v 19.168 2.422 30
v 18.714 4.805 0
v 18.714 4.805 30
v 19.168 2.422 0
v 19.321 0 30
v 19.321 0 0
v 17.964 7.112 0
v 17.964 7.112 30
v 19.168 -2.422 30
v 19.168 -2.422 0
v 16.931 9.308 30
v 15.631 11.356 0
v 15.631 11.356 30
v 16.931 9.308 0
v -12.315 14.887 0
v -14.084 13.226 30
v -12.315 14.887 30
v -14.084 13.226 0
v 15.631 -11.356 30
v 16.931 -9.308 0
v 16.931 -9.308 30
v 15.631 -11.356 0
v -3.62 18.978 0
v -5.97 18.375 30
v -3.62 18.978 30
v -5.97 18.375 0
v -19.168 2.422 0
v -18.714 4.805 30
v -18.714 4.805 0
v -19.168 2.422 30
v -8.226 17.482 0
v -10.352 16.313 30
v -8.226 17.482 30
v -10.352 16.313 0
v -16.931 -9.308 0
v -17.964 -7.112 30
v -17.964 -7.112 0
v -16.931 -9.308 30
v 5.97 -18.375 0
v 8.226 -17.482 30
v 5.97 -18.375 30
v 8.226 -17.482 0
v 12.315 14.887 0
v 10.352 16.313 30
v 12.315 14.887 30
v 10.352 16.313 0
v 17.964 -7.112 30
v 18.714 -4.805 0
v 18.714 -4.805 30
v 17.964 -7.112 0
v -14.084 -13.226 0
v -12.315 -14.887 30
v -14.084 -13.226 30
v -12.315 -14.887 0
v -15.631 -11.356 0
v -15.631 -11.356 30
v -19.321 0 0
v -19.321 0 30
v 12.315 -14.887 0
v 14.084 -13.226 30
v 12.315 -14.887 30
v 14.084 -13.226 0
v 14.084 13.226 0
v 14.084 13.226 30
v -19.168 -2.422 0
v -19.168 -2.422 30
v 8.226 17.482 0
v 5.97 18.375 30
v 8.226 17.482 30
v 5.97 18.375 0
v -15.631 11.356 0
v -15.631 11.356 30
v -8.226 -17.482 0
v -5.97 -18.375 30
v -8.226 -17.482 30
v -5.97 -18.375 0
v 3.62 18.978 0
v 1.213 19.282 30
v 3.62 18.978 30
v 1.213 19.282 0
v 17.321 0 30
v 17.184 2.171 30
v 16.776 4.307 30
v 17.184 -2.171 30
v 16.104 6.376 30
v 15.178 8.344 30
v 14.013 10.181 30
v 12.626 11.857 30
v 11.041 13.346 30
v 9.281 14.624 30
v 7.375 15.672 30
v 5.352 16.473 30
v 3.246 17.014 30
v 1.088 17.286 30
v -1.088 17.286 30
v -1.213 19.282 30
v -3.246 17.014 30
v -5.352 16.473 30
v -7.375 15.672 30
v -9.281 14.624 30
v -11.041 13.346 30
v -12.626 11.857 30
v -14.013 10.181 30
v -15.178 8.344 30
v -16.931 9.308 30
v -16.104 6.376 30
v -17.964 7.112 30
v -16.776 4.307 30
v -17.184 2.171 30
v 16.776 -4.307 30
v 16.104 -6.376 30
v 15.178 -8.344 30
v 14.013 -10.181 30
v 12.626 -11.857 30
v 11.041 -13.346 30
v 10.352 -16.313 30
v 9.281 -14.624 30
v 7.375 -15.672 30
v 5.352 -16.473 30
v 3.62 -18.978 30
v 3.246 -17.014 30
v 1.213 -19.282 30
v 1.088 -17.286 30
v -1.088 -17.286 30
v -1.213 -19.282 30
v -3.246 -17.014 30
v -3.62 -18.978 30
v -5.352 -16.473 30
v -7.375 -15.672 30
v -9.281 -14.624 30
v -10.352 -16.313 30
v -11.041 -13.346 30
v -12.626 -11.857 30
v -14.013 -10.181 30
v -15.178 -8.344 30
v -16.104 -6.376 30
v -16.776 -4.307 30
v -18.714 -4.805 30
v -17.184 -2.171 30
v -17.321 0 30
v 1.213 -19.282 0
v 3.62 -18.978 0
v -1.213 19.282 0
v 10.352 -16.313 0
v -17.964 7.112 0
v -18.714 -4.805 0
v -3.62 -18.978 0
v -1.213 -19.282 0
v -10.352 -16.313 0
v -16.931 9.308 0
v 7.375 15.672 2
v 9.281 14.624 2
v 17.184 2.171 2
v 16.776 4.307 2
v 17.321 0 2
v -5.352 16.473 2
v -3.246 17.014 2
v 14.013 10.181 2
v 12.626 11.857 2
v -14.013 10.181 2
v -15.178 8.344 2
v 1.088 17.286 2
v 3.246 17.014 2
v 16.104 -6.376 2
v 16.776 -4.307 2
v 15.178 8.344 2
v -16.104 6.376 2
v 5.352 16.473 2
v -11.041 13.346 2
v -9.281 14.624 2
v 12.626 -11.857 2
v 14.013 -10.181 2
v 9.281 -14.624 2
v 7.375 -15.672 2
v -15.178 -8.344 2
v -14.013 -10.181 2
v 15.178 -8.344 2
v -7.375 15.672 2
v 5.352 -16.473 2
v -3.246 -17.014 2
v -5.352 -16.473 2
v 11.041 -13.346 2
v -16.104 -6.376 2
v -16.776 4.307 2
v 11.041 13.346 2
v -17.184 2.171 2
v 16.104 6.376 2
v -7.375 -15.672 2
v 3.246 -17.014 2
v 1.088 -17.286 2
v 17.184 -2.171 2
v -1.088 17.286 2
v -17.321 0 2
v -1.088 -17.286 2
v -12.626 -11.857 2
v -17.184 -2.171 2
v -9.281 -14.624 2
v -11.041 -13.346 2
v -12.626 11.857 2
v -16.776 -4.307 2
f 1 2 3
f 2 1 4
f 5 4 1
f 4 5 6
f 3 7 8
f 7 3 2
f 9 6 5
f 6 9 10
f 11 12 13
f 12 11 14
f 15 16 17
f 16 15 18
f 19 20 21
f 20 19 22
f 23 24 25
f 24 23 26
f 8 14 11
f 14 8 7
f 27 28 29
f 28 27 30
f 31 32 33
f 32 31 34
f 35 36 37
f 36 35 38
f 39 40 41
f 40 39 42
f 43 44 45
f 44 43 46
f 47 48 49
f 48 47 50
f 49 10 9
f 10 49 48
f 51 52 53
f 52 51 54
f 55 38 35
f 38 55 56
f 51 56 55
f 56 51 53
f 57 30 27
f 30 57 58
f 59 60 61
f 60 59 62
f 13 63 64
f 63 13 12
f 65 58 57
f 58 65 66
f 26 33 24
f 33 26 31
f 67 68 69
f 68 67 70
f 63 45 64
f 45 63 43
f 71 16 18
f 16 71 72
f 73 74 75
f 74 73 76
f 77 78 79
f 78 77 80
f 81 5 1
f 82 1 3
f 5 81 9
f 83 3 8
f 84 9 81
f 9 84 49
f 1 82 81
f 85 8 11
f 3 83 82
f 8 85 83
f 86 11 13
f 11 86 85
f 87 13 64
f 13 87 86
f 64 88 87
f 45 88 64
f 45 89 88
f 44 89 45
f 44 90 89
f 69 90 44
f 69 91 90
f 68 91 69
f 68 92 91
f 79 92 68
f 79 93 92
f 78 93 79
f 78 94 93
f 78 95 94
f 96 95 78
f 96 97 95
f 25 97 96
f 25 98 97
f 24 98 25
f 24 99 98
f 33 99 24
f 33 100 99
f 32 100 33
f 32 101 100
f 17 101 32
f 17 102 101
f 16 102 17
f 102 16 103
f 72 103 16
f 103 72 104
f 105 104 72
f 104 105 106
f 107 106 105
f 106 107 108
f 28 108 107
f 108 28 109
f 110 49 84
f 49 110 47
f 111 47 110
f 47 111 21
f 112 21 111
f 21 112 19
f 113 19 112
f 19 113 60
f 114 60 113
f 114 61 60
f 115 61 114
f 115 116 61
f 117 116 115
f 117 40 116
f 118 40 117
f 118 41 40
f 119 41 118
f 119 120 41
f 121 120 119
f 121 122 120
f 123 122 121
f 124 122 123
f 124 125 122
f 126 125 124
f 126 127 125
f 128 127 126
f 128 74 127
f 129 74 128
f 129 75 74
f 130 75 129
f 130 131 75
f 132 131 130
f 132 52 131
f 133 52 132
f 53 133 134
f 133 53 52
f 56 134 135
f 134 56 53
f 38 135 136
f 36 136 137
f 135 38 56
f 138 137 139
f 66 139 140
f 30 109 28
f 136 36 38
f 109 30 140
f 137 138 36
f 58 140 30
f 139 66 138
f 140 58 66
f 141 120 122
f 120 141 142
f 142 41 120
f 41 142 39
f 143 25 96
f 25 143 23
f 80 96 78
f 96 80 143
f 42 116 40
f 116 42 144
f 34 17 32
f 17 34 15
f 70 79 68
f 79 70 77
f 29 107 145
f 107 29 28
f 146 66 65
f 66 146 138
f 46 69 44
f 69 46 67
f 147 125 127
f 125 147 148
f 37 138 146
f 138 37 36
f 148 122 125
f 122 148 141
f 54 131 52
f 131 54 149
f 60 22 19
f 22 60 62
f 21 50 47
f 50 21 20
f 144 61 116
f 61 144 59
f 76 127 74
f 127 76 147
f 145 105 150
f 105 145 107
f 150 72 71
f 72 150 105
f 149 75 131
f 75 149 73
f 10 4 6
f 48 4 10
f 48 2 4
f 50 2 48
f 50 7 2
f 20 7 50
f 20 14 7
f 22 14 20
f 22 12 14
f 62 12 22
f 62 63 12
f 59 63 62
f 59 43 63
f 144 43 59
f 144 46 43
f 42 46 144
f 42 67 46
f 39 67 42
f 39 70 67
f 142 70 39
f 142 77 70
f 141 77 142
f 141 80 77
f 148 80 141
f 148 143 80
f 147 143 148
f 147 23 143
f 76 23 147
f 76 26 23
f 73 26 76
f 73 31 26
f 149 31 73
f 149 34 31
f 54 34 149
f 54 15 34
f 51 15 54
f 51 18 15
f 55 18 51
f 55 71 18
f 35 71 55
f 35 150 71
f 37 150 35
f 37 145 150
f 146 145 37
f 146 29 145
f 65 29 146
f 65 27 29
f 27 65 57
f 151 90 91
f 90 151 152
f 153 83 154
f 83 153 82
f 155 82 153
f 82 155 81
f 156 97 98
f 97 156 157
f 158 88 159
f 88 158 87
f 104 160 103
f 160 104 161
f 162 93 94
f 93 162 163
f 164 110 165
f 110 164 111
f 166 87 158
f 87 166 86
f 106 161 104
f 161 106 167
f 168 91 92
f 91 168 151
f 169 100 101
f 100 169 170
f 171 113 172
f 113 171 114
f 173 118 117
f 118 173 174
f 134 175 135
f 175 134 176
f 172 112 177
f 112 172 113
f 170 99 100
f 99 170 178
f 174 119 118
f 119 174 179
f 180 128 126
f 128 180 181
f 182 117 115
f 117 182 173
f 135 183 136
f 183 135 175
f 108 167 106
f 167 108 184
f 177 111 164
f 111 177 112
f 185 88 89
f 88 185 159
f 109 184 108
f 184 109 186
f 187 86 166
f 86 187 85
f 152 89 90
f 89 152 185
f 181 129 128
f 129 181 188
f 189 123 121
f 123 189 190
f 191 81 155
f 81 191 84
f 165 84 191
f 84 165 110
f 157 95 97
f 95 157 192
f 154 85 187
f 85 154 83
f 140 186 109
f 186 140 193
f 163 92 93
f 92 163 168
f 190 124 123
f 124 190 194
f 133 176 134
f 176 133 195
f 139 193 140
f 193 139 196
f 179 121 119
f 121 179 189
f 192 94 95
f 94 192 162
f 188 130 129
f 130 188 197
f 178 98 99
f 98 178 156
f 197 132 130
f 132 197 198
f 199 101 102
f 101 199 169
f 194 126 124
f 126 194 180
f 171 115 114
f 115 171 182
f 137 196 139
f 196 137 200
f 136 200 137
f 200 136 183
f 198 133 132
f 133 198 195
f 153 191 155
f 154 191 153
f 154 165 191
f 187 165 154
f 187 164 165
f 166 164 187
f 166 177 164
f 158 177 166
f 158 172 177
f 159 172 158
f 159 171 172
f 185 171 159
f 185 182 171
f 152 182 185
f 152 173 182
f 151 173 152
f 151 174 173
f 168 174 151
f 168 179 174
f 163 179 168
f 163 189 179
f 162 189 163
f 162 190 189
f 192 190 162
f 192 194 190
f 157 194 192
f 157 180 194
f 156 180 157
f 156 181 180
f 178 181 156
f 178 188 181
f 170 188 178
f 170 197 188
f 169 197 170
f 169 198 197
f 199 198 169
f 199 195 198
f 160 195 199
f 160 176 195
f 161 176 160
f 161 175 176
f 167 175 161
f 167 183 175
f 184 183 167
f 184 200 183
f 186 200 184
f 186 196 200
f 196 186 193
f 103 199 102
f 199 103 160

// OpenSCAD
difference(){
cylinder(h=30,r=10*sqrt(3)+2,$fn=50);
    translate([0,0,2])
    cylinder(h=28.5,r=10*sqrt(3),$fn=50);
}
